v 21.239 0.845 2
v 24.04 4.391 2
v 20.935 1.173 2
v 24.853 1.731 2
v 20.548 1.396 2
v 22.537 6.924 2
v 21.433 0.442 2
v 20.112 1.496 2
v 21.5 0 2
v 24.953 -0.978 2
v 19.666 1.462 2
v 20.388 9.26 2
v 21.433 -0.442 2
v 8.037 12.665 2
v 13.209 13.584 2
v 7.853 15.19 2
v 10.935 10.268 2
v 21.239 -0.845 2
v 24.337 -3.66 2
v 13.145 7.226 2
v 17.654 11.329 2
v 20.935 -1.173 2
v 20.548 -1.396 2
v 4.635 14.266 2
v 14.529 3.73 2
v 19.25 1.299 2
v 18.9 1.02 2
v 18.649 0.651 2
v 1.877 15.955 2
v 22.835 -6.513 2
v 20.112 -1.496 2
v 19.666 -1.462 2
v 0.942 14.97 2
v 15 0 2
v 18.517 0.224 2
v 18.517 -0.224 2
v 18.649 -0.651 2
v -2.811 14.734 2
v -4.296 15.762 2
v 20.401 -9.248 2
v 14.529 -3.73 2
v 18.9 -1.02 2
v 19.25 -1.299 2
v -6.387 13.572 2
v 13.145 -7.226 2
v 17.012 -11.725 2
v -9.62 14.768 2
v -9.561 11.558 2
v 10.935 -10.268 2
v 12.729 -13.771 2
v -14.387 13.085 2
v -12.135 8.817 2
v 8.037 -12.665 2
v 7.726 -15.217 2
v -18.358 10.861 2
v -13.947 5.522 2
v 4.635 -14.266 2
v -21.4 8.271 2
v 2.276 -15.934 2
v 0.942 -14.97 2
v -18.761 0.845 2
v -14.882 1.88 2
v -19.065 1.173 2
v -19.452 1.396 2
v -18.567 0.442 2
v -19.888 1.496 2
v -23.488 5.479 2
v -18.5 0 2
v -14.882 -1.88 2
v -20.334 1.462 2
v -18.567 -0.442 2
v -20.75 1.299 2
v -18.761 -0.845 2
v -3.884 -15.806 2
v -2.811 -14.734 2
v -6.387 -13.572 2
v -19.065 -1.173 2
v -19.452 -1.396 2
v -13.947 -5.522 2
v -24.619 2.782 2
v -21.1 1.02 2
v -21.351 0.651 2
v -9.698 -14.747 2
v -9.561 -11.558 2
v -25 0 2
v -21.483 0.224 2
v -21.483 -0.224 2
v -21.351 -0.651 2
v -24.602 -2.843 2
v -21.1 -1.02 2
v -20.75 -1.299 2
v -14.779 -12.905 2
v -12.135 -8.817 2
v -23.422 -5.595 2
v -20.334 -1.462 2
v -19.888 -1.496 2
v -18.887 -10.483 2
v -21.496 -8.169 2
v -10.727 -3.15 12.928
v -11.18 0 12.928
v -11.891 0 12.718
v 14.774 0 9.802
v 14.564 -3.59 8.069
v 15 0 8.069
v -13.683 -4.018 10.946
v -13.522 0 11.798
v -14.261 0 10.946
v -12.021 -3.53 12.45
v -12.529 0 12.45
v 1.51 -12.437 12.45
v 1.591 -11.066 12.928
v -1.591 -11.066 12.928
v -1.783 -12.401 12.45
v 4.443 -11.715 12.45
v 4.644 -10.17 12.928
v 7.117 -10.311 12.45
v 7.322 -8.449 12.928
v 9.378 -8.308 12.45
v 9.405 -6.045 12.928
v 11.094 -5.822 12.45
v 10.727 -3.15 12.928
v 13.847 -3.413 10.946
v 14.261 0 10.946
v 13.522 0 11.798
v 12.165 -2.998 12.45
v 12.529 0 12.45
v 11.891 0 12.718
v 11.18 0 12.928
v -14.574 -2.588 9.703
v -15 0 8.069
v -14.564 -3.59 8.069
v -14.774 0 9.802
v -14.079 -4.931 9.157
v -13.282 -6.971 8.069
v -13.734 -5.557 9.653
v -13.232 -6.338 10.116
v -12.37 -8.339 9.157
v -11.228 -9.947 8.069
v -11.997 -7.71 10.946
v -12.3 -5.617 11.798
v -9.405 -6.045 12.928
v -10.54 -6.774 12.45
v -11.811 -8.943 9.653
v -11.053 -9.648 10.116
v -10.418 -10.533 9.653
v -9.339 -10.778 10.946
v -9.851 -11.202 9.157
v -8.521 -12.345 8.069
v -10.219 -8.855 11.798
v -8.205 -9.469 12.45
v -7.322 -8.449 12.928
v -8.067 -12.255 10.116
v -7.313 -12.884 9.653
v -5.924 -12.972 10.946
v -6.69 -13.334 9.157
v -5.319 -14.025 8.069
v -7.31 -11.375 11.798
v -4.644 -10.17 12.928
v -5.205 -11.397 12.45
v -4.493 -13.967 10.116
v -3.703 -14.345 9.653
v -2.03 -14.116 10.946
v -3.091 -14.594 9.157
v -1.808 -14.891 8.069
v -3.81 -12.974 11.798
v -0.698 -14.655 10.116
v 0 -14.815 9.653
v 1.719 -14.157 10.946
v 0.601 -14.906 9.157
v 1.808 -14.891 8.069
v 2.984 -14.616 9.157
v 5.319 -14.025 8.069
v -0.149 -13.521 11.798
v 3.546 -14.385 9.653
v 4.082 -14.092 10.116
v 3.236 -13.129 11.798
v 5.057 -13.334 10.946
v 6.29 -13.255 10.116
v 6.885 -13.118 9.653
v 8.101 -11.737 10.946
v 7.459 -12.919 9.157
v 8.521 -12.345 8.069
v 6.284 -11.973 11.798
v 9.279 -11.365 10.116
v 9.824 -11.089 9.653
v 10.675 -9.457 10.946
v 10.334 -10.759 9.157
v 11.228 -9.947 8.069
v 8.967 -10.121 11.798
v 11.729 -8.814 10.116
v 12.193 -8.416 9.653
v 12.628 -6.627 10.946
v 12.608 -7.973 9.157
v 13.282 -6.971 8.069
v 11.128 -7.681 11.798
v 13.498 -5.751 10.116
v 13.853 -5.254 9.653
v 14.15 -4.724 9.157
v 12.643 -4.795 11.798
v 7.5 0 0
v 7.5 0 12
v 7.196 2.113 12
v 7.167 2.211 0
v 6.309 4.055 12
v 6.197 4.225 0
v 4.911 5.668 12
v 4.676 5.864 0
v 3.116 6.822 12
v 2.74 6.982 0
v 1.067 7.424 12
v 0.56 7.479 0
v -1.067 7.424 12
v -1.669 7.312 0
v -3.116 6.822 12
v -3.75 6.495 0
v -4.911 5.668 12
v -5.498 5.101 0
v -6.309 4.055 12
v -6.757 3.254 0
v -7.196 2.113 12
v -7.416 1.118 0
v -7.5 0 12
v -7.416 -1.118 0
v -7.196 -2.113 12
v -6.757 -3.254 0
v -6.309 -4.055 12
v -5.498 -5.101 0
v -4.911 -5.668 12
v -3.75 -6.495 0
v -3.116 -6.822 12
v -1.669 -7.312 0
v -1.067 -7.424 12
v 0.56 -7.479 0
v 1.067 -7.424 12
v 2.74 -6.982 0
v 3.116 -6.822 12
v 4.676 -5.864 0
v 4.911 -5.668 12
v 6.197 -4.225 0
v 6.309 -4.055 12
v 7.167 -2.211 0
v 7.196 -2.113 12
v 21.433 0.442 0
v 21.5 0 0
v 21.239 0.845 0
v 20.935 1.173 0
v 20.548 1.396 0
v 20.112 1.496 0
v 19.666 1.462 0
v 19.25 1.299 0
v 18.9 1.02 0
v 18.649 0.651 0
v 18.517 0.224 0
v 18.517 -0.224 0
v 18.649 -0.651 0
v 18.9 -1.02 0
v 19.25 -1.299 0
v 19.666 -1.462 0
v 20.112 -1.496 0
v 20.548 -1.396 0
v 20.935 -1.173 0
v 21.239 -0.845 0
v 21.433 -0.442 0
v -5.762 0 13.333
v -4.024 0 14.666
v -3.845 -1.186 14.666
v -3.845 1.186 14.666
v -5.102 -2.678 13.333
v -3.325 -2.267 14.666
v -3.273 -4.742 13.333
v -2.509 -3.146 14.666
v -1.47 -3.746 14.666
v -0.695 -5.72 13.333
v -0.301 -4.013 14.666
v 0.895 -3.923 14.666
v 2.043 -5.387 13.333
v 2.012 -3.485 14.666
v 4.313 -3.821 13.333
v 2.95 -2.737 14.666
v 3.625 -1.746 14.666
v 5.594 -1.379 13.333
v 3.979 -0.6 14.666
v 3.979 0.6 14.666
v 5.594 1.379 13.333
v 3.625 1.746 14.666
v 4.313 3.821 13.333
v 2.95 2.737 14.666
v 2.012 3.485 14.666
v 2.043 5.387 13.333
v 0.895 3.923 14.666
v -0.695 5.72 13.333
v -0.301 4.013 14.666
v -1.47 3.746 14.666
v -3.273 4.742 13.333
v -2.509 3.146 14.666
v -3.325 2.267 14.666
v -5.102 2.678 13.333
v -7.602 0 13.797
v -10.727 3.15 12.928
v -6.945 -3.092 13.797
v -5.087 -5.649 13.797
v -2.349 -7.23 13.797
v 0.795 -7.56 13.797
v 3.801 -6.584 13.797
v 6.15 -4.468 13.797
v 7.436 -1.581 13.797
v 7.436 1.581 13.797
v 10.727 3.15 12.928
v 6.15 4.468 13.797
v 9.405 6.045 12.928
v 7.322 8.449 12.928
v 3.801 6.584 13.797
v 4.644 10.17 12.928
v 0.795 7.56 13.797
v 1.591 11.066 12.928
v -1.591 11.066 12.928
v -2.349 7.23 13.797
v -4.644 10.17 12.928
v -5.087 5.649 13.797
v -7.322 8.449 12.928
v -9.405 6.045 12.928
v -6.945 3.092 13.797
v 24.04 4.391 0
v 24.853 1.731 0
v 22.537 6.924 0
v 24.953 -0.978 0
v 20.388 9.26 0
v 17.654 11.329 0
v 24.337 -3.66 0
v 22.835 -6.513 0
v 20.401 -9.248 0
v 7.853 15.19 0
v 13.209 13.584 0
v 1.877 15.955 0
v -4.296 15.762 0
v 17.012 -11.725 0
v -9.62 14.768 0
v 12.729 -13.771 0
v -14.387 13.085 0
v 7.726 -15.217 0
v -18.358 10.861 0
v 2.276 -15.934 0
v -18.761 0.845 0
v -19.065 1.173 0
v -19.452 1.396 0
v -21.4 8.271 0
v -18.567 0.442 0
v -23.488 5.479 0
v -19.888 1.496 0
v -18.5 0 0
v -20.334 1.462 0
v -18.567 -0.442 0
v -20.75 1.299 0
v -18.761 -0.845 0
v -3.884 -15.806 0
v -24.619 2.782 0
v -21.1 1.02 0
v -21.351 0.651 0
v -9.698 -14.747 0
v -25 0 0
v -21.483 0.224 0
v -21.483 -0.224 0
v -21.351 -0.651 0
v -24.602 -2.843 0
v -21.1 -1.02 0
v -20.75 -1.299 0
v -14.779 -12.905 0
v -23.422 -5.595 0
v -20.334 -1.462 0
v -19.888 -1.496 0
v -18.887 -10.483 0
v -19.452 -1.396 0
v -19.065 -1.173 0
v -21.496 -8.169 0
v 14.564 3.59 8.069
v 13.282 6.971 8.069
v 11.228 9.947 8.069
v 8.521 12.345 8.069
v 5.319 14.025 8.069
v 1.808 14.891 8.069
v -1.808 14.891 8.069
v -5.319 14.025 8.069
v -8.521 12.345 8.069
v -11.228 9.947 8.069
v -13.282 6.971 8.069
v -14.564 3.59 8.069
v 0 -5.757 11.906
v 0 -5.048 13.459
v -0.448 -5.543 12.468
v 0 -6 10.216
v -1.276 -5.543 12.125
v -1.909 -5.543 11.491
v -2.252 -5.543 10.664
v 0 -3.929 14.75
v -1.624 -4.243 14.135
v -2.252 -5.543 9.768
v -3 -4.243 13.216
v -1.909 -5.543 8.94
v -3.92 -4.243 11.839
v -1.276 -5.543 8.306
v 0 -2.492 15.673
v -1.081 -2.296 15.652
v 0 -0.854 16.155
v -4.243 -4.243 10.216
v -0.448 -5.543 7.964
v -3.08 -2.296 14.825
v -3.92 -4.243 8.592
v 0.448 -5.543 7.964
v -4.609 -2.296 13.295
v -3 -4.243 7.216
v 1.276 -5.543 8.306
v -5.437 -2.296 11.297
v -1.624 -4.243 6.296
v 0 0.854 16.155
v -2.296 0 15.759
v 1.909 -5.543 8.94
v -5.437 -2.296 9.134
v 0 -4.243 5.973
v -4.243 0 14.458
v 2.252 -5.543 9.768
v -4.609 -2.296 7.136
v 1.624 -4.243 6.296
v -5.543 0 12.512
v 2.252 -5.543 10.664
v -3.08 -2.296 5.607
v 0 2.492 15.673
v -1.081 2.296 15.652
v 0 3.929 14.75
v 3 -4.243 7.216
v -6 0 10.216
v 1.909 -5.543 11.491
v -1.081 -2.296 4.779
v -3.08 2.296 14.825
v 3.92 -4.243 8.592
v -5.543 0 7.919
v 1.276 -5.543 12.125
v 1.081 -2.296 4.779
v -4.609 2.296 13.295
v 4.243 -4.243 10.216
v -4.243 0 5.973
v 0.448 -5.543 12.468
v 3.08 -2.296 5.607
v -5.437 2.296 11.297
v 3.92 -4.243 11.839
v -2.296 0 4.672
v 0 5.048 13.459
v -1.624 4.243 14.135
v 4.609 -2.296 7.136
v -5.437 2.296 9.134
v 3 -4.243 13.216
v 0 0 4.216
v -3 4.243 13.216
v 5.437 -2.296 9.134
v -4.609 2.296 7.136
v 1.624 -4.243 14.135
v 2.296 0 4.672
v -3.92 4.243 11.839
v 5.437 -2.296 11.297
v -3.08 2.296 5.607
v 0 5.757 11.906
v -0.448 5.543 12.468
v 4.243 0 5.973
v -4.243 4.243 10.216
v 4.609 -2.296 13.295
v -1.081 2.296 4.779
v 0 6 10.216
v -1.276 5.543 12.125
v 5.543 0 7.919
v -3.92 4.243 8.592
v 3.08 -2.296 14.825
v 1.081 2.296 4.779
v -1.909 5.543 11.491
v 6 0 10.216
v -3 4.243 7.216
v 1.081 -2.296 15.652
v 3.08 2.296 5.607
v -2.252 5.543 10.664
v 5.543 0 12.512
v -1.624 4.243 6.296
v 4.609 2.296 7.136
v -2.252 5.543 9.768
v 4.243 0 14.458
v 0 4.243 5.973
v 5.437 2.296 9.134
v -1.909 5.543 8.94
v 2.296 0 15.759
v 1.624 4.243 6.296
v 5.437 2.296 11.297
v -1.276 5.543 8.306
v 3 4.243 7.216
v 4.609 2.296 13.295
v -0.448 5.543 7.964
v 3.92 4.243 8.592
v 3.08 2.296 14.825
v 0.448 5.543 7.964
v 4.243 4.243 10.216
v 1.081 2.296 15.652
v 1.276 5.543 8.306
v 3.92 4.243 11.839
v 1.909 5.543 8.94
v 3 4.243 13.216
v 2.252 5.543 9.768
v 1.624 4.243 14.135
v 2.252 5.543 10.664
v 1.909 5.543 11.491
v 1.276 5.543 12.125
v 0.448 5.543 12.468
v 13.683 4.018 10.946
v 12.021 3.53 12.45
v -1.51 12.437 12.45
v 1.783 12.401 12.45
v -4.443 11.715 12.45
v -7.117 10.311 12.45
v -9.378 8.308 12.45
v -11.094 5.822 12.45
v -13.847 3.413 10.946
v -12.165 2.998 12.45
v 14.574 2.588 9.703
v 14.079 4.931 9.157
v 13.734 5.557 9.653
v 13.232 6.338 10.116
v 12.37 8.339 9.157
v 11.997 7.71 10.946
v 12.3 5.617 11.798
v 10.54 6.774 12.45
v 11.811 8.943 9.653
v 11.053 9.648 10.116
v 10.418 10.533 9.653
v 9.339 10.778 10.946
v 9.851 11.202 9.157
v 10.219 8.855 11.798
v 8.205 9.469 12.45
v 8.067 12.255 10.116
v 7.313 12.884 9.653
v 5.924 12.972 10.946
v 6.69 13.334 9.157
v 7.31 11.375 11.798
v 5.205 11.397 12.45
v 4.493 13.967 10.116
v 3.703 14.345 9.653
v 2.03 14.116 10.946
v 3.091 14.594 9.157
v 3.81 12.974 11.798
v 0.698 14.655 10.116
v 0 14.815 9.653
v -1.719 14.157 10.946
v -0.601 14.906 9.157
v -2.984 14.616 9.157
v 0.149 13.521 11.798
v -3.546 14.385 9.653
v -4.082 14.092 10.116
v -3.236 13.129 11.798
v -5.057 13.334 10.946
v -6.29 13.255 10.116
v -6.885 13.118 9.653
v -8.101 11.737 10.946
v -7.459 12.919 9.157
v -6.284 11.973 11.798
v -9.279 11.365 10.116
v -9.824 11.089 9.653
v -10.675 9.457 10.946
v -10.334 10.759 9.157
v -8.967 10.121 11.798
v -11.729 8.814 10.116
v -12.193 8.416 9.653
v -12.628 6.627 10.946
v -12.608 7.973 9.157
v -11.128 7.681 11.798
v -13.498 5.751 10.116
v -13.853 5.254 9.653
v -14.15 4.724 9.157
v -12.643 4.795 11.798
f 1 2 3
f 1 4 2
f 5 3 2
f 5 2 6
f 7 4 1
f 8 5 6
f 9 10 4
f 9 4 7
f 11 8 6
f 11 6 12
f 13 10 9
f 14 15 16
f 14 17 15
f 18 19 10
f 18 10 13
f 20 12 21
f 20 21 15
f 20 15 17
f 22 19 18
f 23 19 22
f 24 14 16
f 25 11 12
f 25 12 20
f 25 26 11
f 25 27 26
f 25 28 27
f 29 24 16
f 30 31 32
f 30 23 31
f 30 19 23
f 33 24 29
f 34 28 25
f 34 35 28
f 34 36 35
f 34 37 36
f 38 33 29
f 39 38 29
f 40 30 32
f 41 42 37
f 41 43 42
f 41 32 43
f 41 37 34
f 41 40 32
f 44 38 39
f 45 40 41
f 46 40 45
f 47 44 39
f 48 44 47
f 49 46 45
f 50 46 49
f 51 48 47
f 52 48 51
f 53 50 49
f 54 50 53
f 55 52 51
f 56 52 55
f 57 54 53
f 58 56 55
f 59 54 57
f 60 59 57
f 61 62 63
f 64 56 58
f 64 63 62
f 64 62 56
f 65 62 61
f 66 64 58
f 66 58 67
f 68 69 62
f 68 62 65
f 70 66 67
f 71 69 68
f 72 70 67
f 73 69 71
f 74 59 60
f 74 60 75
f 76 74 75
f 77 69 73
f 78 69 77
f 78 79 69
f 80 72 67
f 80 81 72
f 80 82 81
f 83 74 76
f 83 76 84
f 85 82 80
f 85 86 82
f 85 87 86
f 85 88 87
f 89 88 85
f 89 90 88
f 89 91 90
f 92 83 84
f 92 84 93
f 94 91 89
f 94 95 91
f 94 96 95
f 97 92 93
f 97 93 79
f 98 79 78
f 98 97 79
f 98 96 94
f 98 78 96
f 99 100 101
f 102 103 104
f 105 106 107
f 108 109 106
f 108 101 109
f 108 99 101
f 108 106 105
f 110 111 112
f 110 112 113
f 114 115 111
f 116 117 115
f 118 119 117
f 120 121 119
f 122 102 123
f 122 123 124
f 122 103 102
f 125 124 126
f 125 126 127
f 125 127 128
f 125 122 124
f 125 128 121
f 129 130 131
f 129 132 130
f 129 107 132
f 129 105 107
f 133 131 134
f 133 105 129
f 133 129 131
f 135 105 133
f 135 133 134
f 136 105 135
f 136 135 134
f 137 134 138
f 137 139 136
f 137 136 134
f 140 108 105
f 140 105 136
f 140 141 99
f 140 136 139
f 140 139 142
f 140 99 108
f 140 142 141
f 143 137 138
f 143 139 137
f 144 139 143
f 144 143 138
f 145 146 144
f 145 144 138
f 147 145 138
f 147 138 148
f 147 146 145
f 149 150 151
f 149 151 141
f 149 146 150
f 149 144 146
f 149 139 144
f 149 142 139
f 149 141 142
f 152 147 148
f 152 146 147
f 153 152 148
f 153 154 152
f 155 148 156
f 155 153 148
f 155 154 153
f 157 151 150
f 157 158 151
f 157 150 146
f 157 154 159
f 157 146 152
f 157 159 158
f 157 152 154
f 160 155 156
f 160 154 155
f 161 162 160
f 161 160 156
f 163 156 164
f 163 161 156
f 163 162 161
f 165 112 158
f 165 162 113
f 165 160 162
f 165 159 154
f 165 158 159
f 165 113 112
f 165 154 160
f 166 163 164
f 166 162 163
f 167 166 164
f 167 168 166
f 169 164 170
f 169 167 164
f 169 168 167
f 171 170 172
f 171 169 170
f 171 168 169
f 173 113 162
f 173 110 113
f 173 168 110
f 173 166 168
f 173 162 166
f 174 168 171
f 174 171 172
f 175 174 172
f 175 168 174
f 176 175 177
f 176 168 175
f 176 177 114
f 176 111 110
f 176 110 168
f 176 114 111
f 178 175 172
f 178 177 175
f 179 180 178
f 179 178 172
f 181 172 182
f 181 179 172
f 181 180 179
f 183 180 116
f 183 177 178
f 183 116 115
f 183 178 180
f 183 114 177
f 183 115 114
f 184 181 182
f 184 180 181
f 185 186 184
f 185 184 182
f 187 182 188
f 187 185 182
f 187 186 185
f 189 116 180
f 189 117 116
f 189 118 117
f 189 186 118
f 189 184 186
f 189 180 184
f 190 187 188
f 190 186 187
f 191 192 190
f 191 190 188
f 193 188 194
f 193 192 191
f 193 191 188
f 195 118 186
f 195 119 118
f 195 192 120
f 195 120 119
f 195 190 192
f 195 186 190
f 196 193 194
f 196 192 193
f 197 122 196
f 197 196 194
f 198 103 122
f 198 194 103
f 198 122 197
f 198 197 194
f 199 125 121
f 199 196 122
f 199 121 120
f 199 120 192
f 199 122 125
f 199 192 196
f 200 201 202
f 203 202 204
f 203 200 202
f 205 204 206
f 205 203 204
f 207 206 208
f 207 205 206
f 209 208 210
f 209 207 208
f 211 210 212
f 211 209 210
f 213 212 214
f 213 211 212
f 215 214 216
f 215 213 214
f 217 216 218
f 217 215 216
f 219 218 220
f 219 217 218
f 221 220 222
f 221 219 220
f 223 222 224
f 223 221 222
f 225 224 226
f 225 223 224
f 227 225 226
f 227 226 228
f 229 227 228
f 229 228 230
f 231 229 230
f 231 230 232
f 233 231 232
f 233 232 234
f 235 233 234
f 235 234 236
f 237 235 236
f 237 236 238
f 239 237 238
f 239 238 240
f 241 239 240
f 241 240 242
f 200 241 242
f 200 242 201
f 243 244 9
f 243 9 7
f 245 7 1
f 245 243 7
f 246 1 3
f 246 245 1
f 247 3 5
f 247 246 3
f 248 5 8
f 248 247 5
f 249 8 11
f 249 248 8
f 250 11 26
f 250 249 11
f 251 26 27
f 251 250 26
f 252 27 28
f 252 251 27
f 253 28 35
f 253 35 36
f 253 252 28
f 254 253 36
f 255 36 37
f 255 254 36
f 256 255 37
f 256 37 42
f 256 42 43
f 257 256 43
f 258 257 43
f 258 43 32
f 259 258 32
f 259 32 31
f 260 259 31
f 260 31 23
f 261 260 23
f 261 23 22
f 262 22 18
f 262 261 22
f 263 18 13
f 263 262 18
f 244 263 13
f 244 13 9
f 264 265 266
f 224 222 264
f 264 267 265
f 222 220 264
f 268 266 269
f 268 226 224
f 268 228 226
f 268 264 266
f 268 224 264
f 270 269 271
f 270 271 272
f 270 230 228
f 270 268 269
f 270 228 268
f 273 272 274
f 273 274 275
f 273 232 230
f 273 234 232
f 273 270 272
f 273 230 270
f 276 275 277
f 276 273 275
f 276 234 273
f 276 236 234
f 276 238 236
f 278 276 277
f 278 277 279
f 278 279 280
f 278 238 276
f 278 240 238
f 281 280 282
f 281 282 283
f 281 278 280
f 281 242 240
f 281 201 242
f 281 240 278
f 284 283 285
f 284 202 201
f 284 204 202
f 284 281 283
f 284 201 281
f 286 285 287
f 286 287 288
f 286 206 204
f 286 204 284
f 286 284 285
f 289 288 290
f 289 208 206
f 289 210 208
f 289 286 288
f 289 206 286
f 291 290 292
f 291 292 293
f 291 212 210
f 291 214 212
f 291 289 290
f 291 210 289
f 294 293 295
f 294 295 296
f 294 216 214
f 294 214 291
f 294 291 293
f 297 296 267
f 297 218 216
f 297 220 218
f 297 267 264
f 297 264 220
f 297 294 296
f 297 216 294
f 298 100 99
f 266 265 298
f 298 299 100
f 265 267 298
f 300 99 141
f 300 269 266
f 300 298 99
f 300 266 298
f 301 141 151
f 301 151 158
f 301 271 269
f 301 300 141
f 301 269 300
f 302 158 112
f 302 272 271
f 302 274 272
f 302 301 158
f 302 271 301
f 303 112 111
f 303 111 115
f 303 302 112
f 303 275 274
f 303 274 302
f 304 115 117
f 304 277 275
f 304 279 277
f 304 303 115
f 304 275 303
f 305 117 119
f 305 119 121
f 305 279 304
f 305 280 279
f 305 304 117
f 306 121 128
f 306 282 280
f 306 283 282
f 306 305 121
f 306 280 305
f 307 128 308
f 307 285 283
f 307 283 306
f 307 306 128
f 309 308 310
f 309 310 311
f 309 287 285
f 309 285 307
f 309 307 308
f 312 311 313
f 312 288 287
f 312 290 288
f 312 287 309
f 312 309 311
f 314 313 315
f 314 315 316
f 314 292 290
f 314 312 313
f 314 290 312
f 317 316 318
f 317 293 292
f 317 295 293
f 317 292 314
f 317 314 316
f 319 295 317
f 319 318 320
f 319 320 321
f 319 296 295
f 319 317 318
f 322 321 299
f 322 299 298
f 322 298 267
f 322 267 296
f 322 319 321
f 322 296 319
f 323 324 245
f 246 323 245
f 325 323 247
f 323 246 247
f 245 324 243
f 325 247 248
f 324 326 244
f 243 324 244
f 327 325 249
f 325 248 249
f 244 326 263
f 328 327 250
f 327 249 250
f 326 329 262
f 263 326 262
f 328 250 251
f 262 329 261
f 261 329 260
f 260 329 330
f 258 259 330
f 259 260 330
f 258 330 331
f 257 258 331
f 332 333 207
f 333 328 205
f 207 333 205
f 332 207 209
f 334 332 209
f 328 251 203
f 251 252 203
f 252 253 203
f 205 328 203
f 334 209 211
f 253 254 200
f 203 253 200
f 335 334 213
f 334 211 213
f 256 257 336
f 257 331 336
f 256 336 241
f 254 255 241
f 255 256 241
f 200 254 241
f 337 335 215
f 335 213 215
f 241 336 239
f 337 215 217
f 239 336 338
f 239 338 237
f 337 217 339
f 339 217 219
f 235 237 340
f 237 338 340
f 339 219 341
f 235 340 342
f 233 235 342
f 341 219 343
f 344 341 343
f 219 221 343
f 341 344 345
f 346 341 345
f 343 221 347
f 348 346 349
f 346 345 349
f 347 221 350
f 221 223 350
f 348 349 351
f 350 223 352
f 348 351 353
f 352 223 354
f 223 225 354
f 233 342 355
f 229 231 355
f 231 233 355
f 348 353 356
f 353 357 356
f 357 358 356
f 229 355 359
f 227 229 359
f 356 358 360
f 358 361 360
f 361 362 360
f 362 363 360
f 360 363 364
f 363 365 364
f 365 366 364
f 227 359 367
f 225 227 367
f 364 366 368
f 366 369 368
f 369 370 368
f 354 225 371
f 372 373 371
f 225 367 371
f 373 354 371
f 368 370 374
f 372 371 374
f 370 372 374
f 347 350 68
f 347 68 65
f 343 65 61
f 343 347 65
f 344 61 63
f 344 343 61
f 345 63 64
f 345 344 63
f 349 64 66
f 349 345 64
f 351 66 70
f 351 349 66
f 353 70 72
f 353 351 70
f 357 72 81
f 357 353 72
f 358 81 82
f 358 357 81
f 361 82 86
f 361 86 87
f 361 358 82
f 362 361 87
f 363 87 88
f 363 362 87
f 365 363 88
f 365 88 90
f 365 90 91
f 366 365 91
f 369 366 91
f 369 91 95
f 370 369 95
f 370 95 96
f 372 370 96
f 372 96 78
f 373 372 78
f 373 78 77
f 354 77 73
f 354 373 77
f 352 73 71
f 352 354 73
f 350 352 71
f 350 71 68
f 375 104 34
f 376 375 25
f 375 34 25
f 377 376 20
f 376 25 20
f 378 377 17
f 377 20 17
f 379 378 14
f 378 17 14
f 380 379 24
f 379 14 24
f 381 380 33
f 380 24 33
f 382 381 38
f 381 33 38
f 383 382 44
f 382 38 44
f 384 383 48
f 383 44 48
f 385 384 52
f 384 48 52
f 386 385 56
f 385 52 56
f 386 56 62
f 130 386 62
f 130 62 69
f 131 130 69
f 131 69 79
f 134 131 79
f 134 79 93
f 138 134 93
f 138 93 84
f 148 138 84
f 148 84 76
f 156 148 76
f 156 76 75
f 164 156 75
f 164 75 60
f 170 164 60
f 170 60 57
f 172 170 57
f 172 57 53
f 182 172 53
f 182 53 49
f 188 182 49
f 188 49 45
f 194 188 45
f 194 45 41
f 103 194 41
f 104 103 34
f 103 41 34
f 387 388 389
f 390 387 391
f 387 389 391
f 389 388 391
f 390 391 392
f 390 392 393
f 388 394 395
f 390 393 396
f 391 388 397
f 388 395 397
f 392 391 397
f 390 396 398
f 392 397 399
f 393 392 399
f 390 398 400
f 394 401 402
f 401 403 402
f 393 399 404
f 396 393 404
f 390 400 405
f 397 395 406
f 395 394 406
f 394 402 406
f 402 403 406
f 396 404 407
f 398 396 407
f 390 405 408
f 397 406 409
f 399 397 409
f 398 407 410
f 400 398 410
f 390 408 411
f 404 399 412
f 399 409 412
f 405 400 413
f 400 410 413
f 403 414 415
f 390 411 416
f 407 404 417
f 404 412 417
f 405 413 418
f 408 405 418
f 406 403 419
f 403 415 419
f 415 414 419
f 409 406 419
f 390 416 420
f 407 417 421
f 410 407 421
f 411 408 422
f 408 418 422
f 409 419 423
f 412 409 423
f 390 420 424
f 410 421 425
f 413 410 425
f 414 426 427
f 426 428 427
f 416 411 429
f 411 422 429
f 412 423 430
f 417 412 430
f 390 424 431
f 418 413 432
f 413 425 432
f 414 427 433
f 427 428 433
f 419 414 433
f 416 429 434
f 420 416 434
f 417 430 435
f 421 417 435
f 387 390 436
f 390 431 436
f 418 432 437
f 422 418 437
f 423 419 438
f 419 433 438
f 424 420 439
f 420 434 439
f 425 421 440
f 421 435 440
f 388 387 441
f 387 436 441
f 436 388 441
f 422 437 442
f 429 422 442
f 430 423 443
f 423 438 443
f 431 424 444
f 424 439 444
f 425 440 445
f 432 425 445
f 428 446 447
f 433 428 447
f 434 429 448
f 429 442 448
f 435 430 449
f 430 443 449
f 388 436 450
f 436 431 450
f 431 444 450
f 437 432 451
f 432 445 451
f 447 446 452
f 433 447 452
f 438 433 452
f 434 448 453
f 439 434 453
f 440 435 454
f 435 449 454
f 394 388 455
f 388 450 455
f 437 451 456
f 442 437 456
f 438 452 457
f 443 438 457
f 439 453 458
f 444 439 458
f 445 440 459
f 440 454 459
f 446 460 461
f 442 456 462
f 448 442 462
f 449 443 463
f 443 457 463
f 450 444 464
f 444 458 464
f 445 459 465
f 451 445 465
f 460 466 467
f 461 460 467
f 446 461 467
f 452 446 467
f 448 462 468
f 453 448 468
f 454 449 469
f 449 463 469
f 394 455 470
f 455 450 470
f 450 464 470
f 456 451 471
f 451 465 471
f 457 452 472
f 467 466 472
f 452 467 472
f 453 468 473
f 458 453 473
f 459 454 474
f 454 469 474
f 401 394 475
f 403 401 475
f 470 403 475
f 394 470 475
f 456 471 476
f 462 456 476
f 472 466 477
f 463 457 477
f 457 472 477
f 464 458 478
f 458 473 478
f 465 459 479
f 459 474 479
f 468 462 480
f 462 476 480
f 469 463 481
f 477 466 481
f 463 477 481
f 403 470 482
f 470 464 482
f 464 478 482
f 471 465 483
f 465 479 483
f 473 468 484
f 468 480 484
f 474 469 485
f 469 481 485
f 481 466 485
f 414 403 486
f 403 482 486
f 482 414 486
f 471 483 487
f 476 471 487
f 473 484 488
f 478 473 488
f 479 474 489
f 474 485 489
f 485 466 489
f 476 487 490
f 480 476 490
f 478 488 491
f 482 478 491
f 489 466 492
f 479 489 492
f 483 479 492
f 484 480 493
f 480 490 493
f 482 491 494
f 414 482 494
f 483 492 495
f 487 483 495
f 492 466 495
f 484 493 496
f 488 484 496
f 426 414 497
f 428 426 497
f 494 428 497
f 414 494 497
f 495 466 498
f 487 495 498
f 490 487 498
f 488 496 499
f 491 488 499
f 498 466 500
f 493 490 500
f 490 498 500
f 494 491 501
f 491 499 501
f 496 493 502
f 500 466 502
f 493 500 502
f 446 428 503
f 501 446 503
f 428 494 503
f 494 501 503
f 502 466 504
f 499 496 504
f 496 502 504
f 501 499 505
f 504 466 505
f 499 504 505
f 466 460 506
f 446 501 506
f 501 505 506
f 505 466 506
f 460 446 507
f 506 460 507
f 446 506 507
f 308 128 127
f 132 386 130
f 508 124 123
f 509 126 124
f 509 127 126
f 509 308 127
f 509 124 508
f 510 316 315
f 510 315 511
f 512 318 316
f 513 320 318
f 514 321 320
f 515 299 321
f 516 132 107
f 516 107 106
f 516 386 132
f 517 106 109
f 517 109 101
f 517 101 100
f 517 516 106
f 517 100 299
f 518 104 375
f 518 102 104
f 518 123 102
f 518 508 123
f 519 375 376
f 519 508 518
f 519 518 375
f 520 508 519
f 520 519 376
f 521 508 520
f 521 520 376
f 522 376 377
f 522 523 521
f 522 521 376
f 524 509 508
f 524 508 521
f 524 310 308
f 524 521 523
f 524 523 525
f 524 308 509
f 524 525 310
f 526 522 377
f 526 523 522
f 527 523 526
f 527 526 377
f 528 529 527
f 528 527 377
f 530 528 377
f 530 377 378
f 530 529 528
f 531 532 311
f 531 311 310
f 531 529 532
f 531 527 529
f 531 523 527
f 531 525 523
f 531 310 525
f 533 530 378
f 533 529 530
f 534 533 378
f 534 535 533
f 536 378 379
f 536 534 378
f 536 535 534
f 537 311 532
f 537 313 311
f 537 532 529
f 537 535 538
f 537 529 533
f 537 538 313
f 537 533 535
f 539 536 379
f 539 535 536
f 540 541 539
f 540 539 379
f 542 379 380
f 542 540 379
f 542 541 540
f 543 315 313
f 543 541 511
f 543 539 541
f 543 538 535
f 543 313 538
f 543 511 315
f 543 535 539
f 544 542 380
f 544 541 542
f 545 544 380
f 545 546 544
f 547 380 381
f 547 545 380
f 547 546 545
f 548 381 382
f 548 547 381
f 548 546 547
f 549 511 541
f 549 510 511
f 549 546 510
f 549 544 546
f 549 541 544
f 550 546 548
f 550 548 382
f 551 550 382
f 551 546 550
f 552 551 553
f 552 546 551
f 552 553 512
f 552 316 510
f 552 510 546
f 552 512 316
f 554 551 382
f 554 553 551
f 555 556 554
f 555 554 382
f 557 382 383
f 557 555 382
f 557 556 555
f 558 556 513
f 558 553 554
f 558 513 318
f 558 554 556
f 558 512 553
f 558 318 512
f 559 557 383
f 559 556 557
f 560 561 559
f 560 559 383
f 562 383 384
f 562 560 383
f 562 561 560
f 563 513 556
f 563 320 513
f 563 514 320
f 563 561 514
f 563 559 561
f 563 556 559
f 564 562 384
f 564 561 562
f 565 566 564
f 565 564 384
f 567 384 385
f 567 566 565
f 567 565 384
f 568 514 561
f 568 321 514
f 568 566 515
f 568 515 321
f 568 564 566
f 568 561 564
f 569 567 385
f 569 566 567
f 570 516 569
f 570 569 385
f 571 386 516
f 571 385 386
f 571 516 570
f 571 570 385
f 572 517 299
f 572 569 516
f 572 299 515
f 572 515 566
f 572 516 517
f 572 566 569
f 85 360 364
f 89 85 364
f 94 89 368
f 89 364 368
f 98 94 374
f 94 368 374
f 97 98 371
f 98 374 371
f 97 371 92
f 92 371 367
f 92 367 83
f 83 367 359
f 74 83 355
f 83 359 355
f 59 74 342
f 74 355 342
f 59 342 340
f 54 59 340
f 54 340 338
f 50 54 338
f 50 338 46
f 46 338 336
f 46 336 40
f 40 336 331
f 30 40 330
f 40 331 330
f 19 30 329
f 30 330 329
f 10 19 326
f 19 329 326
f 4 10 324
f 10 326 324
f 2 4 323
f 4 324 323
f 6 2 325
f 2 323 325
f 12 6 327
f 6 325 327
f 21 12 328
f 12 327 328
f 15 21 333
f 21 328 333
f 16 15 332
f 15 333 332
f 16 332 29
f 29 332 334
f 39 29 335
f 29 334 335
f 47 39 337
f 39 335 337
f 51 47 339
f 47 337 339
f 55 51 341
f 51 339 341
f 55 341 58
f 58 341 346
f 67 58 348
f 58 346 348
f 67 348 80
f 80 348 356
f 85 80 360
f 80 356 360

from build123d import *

# Parameters (mm, degrees)
SKETCH1_RX          = 25
SKETCH1_RY          = 16
SKETCH1_R           = 15
SKETCH1_R_2         = 1.5
BOSS_EXTRUDE6_DEPTH = 2
SKETCH1_11_R        = 15
SKETCH1_11_R_2      = 7.5
BOSS_EXTRUDE7_DEPTH = 12


with BuildPart() as part:
    # Sketch1 → Boss-Extrude6 (new body)
    with BuildSketch(Plane.XY):
        with Locations(Location((0, 0), (0, 0, 180))):
            Ellipse(SKETCH1_RX, SKETCH1_RY)
        Circle(SKETCH1_R, mode=Mode.SUBTRACT)
        with Locations((-20, 0)):
            Circle(SKETCH1_R_2, mode=Mode.SUBTRACT)
        with Locations((20, 0)):
            Circle(SKETCH1_R_2, mode=Mode.SUBTRACT)
    extrude(amount=BOSS_EXTRUDE6_DEPTH)

    # Sketch1<11> → Boss-Extrude7 (add)
    with BuildSketch(Plane.XY):
        Circle(SKETCH1_11_R)
        Circle(SKETCH1_11_R_2, mode=Mode.SUBTRACT)
    extrude(amount=BOSS_EXTRUDE7_DEPTH)

    # Sketch6 → Revolve2 (revolve)
    with BuildSketch(Plane(origin=(0, 0, 0), x_dir=(0, 0, -1), z_dir=(1, 0, 0)), mode=Mode.PRIVATE) as revolve2_sk:
        Polygon((-12, 15), (-14.666344011, 4.0237782), (-12, 7.5), align=None)
    revolve(revolve2_sk.sketch.rotate(Axis((0, 0, 0), (0, 0, 1)), 90), axis=Axis((0, 0, 0), (0, 0, 1)))

    # Fillet1
    # a fillet whose section is not a circle: 5 mm, written as the material it takes off along each edge
    with BuildSketch(Plane(origin=(0, 0, 12), x_dir=(-1, 0, 0), z_dir=(0, 1, 0))) as fillet1_piece_1:
        with BuildLine():
            Bezier((15, -3.93081081), (15, 0), (11.180275121, 0.927887641), weights=[1, 1, 1])
            Line((11.180275121, 0.927887641), (15, 0))
            Line((15, 0), (15, -3.93081081))
        make_face()
    revolve(axis=Axis((0, 0, 12), (0, 0, 1)), revolution_arc=180, mode=Mode.SUBTRACT)
    with BuildSketch(Plane(origin=(0, 0, 12), x_dir=(1, 0, 0), z_dir=(0, -1, 0))) as fillet1_piece_2:
        with BuildLine():
            Bezier((15, -3.93081081), (15, 0), (11.180275121, 0.927887641), weights=[1, 1, 1])
            Line((11.180275121, 0.927887641), (15, 0))
            Line((15, 0), (15, -3.93081081))
        make_face()
    revolve(axis=Axis((0, 0, 12), (0, 0, 1)), revolution_arc=180, mode=Mode.SUBTRACT)


with BuildPart() as body_2:
    # Sketch5 → Revolve1 (revolve)
    with BuildSketch(Plane(origin=(0, 0, 0), x_dir=(0, 0, -1), z_dir=(1, 0, 0))):
        with BuildLine():
            Line((-10.215590255, 6), (-10.215590255, -6))
            ThreePointArc((-10.215590255, -6), (-16.215590255, 0), (-10.215590255, 6))
        make_face()
    revolve(axis=Axis((0, 6, 10.215590255), (0, -1, 0)))


solid = Compound([part.part, body_2.part])
